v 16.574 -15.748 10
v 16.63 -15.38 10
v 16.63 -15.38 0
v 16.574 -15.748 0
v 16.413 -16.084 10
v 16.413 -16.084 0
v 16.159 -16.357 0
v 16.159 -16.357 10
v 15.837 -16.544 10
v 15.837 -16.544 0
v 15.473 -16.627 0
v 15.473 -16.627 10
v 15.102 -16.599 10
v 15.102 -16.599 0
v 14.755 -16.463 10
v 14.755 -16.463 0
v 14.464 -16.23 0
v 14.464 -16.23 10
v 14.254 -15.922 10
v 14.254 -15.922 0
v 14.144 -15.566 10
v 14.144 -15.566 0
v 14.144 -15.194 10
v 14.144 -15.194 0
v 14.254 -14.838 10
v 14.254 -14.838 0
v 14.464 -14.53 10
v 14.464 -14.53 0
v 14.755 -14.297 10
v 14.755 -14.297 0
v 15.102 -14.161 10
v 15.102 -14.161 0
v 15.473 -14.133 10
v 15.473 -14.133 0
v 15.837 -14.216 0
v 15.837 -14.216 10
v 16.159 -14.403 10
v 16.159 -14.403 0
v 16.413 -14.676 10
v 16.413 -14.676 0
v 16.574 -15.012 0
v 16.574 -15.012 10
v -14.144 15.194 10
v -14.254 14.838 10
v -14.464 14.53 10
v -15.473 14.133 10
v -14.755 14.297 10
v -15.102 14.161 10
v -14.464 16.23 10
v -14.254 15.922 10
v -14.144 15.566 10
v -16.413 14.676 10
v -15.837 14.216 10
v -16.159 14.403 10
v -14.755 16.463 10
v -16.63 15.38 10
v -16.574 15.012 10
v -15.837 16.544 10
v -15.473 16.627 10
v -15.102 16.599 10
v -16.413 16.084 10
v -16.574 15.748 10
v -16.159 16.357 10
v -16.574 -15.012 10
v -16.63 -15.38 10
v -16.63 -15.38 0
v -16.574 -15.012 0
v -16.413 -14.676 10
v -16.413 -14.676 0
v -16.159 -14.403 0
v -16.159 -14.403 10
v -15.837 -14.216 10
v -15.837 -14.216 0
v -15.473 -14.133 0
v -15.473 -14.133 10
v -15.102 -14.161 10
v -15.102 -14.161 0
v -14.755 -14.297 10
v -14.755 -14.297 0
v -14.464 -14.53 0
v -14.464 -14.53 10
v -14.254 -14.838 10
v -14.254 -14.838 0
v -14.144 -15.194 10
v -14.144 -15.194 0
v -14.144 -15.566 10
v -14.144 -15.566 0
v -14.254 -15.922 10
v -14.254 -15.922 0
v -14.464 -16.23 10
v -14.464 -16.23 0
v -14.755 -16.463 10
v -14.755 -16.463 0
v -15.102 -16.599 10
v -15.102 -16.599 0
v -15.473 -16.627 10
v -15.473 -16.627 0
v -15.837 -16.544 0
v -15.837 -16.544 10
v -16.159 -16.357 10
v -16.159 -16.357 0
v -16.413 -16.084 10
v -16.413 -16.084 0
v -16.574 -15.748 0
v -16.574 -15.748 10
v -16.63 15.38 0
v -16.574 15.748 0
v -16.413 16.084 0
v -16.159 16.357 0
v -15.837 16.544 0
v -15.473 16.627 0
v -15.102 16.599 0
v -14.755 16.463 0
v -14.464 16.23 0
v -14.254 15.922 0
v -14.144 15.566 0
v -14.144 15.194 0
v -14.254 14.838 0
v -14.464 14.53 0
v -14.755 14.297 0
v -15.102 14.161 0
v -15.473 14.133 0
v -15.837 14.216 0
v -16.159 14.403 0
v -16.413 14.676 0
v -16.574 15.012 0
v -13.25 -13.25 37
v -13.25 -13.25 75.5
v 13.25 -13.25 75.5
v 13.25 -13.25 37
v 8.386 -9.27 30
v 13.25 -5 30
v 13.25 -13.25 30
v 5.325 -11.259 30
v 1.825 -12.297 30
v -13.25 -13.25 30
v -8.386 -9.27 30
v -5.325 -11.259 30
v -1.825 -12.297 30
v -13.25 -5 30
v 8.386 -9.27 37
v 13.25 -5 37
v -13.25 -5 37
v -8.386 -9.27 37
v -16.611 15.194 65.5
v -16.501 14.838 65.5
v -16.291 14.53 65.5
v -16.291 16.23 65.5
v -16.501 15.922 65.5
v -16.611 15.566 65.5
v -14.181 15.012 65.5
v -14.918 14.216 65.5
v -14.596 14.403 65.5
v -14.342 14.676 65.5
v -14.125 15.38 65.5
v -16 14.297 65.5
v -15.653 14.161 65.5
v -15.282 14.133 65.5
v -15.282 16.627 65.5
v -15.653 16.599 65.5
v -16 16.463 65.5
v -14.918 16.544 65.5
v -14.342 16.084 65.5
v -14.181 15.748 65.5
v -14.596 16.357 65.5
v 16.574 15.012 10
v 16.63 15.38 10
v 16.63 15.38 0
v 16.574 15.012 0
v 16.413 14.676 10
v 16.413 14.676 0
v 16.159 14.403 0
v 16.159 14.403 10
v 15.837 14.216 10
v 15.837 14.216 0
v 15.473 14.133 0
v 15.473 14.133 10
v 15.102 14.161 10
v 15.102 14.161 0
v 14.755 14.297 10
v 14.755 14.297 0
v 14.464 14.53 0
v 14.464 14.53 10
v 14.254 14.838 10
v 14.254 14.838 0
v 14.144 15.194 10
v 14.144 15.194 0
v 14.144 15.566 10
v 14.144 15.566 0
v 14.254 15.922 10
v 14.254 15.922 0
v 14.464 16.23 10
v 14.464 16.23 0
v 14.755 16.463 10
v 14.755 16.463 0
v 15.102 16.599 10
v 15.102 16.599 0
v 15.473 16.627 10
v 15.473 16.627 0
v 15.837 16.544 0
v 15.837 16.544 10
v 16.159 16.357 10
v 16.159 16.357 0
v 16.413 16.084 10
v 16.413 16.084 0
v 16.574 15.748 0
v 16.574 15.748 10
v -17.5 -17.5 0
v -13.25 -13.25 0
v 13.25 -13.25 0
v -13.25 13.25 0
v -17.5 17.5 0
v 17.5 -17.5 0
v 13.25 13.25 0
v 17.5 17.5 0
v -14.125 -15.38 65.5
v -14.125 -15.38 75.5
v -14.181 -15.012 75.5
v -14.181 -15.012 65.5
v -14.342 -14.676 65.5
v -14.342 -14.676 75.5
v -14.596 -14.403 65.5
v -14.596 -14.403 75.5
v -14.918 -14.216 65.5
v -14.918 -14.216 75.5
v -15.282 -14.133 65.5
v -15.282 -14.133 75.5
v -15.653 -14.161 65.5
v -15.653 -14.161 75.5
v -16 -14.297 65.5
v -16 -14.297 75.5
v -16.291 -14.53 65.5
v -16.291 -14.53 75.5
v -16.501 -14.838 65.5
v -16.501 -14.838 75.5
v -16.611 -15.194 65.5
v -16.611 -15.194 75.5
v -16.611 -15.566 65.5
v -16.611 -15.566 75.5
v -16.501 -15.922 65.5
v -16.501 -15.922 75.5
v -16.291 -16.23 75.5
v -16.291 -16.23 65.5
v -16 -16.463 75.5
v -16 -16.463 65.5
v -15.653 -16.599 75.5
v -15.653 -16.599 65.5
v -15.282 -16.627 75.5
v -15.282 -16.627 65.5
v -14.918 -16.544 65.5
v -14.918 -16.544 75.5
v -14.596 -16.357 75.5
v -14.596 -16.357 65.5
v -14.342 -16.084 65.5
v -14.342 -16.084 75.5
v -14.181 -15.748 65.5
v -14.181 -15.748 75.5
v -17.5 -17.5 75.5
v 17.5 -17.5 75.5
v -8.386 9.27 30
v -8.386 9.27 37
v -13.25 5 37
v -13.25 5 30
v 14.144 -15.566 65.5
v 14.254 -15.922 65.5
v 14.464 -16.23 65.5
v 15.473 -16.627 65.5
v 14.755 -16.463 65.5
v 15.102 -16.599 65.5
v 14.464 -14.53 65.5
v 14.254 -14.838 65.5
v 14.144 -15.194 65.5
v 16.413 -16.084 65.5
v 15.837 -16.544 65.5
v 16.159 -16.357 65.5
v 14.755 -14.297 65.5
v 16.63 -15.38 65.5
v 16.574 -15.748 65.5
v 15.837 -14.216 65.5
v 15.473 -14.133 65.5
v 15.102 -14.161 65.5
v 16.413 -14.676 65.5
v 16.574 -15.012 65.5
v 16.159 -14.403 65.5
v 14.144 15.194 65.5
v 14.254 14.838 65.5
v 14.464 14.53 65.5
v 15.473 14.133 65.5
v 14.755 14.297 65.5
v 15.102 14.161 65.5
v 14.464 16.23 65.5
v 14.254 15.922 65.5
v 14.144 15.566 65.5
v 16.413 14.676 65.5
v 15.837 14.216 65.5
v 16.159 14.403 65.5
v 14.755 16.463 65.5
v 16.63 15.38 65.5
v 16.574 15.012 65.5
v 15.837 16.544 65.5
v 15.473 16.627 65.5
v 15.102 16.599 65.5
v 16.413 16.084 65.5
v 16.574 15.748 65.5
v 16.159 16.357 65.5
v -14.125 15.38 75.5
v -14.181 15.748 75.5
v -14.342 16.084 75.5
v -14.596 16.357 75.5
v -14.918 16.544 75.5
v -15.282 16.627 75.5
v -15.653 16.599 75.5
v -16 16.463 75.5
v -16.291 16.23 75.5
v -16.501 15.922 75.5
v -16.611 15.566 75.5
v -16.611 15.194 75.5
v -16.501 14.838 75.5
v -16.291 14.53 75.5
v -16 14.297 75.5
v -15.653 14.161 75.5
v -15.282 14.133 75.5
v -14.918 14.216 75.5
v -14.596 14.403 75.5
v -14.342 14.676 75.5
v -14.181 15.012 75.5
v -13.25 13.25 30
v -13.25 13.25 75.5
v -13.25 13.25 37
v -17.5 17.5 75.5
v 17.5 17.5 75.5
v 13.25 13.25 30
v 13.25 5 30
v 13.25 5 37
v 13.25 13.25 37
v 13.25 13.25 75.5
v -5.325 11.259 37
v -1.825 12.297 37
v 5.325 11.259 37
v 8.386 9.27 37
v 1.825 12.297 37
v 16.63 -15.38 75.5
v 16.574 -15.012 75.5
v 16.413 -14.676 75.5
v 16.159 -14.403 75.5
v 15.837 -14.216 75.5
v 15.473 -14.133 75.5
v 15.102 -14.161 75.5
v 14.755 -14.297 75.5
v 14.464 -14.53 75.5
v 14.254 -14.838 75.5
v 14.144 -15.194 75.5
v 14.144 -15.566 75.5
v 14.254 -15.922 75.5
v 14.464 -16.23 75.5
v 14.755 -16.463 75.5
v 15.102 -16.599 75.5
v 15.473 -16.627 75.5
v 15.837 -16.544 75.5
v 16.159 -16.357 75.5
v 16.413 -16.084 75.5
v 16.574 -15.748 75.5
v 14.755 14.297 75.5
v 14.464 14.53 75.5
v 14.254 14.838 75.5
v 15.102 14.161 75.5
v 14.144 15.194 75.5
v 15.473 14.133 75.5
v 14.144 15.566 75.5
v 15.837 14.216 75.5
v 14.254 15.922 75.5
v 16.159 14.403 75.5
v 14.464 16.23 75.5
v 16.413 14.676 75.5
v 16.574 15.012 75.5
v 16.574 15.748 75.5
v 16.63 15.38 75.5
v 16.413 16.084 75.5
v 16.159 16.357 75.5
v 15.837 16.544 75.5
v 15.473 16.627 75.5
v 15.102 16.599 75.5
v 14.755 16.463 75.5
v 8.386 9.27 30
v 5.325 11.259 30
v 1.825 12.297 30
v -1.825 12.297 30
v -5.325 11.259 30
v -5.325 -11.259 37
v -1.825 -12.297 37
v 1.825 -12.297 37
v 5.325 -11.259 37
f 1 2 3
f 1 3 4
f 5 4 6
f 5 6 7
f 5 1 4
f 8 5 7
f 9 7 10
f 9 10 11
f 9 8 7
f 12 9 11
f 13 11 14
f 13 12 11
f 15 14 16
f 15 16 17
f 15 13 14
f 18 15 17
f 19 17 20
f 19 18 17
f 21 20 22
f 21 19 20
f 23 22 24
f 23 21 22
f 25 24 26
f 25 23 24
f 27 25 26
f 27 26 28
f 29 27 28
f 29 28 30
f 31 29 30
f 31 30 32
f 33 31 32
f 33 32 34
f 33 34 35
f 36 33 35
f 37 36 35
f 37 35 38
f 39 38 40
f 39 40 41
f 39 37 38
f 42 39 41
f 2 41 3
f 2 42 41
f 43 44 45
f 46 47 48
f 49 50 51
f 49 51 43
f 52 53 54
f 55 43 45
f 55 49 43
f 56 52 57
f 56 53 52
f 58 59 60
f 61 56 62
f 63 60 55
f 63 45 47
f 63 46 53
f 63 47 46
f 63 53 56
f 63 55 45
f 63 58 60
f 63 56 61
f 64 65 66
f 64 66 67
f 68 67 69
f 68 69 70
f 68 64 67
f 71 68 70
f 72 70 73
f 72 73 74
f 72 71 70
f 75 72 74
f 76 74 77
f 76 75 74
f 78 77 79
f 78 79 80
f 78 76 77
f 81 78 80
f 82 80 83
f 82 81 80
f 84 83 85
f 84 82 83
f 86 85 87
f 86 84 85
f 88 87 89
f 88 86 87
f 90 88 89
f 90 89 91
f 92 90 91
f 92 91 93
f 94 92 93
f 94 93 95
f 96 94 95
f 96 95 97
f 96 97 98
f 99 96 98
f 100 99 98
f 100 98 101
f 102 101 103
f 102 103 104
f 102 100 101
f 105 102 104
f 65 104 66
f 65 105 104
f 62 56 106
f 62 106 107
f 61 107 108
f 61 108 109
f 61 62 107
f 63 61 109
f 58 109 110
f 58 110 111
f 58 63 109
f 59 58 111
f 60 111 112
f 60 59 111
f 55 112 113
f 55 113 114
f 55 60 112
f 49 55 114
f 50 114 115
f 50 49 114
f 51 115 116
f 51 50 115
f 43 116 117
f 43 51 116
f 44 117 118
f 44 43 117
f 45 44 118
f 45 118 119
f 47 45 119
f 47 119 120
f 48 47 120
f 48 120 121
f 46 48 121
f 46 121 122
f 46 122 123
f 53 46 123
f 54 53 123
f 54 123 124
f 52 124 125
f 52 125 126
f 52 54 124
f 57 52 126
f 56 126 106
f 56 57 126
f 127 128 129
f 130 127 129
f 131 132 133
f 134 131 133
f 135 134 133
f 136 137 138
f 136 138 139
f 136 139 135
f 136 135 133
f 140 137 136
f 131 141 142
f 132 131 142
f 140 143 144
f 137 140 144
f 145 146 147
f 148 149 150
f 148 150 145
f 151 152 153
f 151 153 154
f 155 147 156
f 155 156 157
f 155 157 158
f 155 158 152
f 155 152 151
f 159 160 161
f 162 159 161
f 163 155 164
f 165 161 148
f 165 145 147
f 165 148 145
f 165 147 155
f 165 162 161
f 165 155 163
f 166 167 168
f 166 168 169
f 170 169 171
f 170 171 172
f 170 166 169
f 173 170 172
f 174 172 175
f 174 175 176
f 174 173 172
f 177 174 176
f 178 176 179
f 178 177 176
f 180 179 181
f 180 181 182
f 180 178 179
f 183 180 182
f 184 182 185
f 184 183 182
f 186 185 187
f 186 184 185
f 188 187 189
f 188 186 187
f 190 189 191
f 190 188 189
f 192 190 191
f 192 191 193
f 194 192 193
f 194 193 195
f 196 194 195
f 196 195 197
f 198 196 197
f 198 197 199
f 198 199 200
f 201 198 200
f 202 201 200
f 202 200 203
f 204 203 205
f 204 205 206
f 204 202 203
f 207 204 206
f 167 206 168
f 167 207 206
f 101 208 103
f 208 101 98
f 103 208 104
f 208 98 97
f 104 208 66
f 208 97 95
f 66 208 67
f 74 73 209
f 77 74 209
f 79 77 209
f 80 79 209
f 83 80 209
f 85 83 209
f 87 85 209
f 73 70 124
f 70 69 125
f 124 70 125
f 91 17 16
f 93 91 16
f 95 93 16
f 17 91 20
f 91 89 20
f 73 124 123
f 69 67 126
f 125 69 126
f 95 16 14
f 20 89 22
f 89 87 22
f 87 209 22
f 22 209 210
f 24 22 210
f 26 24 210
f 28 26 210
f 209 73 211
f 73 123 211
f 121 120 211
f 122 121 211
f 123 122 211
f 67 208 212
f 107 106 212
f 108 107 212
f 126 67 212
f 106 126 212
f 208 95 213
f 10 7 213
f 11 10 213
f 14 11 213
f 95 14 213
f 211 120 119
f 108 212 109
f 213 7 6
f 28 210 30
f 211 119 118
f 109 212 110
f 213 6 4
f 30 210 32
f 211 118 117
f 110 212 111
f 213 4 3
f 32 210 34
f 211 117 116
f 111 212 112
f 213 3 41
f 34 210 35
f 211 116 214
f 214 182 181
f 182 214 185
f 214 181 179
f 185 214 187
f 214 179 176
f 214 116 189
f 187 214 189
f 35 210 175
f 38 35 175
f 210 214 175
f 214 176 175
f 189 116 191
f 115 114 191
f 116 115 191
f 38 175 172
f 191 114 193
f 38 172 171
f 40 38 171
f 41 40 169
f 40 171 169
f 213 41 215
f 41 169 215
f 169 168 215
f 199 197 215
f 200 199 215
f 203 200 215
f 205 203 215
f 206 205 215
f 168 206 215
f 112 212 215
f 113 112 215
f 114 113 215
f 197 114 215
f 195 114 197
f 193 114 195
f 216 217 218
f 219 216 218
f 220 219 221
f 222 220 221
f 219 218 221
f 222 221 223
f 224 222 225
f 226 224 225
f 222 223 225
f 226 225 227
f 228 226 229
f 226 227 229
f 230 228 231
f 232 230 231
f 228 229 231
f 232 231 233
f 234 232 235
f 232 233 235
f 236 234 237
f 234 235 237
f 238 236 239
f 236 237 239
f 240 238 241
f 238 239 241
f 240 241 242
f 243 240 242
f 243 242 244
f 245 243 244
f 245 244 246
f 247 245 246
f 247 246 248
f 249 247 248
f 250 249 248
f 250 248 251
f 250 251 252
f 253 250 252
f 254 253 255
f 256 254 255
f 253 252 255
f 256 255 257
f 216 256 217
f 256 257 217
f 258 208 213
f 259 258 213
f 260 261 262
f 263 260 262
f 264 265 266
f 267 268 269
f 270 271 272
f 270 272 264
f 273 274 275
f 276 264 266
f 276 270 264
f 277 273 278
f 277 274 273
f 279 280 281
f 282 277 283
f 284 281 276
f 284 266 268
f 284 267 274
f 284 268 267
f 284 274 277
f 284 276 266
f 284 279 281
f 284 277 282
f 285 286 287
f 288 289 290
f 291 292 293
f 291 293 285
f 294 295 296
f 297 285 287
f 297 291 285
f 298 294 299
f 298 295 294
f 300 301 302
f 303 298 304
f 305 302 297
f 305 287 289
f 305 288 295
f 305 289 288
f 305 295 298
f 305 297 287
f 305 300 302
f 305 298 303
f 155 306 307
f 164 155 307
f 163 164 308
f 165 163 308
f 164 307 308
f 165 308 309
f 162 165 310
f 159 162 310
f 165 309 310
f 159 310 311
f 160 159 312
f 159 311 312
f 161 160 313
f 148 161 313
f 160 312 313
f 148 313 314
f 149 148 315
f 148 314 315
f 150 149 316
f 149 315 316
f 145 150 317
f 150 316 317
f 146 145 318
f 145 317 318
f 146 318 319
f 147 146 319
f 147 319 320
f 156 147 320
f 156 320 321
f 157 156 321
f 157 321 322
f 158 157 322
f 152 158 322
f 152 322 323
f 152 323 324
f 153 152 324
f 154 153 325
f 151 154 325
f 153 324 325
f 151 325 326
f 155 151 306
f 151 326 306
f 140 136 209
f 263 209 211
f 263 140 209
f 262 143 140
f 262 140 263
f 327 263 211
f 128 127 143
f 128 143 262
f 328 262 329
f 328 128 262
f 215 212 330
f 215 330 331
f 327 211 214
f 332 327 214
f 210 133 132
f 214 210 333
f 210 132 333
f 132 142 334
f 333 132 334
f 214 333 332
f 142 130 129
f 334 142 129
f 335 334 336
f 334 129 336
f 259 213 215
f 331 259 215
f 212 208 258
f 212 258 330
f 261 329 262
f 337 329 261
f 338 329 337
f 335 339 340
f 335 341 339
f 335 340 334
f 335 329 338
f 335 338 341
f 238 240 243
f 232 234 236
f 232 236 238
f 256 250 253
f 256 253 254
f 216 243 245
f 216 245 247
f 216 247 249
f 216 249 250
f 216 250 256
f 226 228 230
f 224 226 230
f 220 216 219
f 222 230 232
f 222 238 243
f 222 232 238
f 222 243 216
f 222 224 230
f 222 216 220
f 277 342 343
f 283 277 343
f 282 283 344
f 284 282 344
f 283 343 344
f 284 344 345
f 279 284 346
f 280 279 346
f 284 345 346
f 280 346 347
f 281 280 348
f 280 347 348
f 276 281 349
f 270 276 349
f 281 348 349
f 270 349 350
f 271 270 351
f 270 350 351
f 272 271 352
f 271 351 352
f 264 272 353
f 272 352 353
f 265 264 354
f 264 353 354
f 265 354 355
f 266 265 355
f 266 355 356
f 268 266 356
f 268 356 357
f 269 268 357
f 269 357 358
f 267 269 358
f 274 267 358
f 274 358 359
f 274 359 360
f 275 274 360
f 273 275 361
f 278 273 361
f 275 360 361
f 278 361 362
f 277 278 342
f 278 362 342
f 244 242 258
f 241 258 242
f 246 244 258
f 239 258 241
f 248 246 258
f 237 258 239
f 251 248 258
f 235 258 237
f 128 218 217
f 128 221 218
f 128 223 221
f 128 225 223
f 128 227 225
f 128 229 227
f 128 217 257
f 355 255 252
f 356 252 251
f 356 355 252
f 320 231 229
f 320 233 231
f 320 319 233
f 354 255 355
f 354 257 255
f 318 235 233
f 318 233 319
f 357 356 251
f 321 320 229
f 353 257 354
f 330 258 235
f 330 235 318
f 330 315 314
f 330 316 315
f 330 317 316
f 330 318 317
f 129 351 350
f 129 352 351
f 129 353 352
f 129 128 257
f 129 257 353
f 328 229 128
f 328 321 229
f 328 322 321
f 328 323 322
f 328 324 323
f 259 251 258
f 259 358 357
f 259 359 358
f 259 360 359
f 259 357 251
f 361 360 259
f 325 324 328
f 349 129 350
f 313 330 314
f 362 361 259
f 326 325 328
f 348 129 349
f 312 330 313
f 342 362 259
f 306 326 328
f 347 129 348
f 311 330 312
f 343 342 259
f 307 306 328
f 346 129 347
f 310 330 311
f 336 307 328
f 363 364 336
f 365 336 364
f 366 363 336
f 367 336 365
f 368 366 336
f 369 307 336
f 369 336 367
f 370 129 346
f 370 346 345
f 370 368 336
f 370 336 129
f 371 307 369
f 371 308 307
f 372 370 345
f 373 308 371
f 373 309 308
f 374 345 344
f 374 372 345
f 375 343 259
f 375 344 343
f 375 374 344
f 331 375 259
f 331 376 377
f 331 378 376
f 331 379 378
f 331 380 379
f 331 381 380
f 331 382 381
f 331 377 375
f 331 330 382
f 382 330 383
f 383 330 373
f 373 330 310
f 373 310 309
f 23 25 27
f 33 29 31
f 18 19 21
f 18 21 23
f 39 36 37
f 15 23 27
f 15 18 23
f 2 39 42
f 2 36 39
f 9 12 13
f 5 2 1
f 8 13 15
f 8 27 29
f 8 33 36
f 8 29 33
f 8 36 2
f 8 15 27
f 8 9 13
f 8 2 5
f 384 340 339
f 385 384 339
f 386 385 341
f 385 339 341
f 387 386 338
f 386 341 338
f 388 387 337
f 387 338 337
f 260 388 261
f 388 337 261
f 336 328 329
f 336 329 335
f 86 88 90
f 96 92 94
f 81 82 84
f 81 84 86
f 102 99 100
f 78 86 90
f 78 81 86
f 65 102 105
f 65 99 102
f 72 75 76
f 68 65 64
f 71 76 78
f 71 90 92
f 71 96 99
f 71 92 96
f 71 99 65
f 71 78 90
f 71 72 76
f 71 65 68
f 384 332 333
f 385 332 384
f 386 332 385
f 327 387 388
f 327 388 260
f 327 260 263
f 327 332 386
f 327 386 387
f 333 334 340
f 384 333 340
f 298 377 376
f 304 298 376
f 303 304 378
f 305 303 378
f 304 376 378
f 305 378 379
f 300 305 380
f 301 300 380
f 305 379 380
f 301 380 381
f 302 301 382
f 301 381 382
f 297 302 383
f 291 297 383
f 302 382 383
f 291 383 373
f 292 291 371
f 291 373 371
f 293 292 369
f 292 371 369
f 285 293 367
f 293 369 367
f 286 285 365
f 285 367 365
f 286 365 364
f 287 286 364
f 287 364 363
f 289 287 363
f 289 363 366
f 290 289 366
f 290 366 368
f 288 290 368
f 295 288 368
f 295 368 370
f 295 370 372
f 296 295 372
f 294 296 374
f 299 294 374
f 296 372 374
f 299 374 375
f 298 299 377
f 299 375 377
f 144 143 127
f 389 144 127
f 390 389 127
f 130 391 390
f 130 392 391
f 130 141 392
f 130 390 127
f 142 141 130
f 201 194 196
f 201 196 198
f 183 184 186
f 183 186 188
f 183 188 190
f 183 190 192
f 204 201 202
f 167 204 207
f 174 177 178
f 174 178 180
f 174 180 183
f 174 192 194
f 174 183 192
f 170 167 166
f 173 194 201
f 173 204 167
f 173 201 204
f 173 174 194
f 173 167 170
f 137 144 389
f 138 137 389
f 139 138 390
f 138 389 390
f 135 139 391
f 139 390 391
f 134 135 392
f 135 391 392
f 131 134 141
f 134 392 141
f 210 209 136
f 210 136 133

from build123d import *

# Parameters (mm, degrees)
CROQUIS1_W              = 35
CROQUIS1_H              = 35
SALIENTE_EXTRUIR2_DEPTH = 75.5
CROQUIS2_W              = 26.5
CROQUIS2_H              = 26.5
CORTAR_EXTRUIR1_DEPTH   = 80
CROQUIS4_R              = 1.25
CORTAR_EXTRUIR2_DEPTH   = 10
CROQUIS6_W              = 26.5
CROQUIS6_H              = 26.5
SALIENTE_EXTRUIR3_DEPTH = 30
CORTAR_EXTRUIR3_DEPTH   = 27
CROQUIS8_W              = 26.5
CROQUIS8_H              = 26.5
CORTAR_EXTRUIR4_DEPTH   = 23
CORTAR_EXTRUIR5_START   = -10
CROQUIS9_R              = 1.25
CORTAR_EXTRUIR5_DEPTH   = 10


with BuildPart() as part:
    # Croquis1 → Saliente-Extruir2 (new body)
    with BuildSketch(Plane.XY):
        Rectangle(CROQUIS1_W, CROQUIS1_H)
    extrude(amount=SALIENTE_EXTRUIR2_DEPTH)

    # Croquis2 → Cortar-Extruir1 (cut)
    with BuildSketch(Plane.XY.offset(75.5)):
        Rectangle(CROQUIS2_W, CROQUIS2_H)
    extrude(amount=-CORTAR_EXTRUIR1_DEPTH, mode=Mode.SUBTRACT)

    # Croquis4 → Cortar-Extruir2 (cut)
    with BuildSketch(Plane.XY.offset(75.5)):
        with Locations((-15.375, 15.38)):
            Circle(CROQUIS4_R)
        with Locations((15.38, 15.38)):
            Circle(CROQUIS4_R)
        with Locations((15.38, -15.38)):
            Circle(CROQUIS4_R)
        with Locations((-15.375, -15.38)):
            Circle(CROQUIS4_R)
    extrude(amount=-CORTAR_EXTRUIR2_DEPTH, mode=Mode.SUBTRACT)

    # Croquis6 → Saliente-Extruir3 (add)
    with BuildSketch(Plane.XY.offset(7)):
        Rectangle(CROQUIS6_W, CROQUIS6_H)
    extrude(amount=SALIENTE_EXTRUIR3_DEPTH)

    # Croquis7 → Cortar-Extruir3 (cut)
    with BuildSketch(Plane.XY.offset(37)):
        with BuildLine():
            Line((13.25, -5), (13.25, 5))
            Line((13.25, 5), (8.385525636, 9.270003226))
            ThreePointArc((8.385525636, 9.270003226), (0, 12.428301163), (-8.385525636, 9.270003226))
            Line((-8.385525636, 9.270003226), (-13.25, 5))
            Line((-13.25, 5), (-13.25, -5))
            Line((-13.25, -5), (-8.385525636, -9.270003226))
            ThreePointArc((-8.385525636, -9.270003226), (0, -12.428301163), (8.385525636, -9.270003226))
            Line((8.385525636, -9.270003226), (13.25, -5))
        make_face()
    extrude(amount=-CORTAR_EXTRUIR3_DEPTH, mode=Mode.SUBTRACT)

    # Croquis8 → Cortar-Extruir4 (cut)
    with BuildSketch(Plane(origin=(0, 0, 7), x_dir=(-1, 0, 0), z_dir=(0, 0, -1))):
        Rectangle(CROQUIS8_W, CROQUIS8_H)
    extrude(amount=-CORTAR_EXTRUIR4_DEPTH, mode=Mode.SUBTRACT)

    # Croquis9 → Cortar-Extruir5 (cut)
    with BuildSketch(Plane(origin=(0, 0, 0), x_dir=(-1, 0, 0), z_dir=(0, 0, -1)).offset(CORTAR_EXTRUIR5_START)):
        with Locations(Location((-15.38, 15.38, 0), (0, 0, 180))):
            Circle(CROQUIS9_R)
        with Locations((15.38, 15.38)):
            Circle(CROQUIS9_R)
        with Locations((15.38, -15.38)):
            Circle(CROQUIS9_R)
        with Locations(Location((-15.38, -15.38, 0), (0, 0, 180))):
            Circle(CROQUIS9_R)
    extrude(amount=CORTAR_EXTRUIR5_DEPTH, mode=Mode.SUBTRACT)


solid = part.part
